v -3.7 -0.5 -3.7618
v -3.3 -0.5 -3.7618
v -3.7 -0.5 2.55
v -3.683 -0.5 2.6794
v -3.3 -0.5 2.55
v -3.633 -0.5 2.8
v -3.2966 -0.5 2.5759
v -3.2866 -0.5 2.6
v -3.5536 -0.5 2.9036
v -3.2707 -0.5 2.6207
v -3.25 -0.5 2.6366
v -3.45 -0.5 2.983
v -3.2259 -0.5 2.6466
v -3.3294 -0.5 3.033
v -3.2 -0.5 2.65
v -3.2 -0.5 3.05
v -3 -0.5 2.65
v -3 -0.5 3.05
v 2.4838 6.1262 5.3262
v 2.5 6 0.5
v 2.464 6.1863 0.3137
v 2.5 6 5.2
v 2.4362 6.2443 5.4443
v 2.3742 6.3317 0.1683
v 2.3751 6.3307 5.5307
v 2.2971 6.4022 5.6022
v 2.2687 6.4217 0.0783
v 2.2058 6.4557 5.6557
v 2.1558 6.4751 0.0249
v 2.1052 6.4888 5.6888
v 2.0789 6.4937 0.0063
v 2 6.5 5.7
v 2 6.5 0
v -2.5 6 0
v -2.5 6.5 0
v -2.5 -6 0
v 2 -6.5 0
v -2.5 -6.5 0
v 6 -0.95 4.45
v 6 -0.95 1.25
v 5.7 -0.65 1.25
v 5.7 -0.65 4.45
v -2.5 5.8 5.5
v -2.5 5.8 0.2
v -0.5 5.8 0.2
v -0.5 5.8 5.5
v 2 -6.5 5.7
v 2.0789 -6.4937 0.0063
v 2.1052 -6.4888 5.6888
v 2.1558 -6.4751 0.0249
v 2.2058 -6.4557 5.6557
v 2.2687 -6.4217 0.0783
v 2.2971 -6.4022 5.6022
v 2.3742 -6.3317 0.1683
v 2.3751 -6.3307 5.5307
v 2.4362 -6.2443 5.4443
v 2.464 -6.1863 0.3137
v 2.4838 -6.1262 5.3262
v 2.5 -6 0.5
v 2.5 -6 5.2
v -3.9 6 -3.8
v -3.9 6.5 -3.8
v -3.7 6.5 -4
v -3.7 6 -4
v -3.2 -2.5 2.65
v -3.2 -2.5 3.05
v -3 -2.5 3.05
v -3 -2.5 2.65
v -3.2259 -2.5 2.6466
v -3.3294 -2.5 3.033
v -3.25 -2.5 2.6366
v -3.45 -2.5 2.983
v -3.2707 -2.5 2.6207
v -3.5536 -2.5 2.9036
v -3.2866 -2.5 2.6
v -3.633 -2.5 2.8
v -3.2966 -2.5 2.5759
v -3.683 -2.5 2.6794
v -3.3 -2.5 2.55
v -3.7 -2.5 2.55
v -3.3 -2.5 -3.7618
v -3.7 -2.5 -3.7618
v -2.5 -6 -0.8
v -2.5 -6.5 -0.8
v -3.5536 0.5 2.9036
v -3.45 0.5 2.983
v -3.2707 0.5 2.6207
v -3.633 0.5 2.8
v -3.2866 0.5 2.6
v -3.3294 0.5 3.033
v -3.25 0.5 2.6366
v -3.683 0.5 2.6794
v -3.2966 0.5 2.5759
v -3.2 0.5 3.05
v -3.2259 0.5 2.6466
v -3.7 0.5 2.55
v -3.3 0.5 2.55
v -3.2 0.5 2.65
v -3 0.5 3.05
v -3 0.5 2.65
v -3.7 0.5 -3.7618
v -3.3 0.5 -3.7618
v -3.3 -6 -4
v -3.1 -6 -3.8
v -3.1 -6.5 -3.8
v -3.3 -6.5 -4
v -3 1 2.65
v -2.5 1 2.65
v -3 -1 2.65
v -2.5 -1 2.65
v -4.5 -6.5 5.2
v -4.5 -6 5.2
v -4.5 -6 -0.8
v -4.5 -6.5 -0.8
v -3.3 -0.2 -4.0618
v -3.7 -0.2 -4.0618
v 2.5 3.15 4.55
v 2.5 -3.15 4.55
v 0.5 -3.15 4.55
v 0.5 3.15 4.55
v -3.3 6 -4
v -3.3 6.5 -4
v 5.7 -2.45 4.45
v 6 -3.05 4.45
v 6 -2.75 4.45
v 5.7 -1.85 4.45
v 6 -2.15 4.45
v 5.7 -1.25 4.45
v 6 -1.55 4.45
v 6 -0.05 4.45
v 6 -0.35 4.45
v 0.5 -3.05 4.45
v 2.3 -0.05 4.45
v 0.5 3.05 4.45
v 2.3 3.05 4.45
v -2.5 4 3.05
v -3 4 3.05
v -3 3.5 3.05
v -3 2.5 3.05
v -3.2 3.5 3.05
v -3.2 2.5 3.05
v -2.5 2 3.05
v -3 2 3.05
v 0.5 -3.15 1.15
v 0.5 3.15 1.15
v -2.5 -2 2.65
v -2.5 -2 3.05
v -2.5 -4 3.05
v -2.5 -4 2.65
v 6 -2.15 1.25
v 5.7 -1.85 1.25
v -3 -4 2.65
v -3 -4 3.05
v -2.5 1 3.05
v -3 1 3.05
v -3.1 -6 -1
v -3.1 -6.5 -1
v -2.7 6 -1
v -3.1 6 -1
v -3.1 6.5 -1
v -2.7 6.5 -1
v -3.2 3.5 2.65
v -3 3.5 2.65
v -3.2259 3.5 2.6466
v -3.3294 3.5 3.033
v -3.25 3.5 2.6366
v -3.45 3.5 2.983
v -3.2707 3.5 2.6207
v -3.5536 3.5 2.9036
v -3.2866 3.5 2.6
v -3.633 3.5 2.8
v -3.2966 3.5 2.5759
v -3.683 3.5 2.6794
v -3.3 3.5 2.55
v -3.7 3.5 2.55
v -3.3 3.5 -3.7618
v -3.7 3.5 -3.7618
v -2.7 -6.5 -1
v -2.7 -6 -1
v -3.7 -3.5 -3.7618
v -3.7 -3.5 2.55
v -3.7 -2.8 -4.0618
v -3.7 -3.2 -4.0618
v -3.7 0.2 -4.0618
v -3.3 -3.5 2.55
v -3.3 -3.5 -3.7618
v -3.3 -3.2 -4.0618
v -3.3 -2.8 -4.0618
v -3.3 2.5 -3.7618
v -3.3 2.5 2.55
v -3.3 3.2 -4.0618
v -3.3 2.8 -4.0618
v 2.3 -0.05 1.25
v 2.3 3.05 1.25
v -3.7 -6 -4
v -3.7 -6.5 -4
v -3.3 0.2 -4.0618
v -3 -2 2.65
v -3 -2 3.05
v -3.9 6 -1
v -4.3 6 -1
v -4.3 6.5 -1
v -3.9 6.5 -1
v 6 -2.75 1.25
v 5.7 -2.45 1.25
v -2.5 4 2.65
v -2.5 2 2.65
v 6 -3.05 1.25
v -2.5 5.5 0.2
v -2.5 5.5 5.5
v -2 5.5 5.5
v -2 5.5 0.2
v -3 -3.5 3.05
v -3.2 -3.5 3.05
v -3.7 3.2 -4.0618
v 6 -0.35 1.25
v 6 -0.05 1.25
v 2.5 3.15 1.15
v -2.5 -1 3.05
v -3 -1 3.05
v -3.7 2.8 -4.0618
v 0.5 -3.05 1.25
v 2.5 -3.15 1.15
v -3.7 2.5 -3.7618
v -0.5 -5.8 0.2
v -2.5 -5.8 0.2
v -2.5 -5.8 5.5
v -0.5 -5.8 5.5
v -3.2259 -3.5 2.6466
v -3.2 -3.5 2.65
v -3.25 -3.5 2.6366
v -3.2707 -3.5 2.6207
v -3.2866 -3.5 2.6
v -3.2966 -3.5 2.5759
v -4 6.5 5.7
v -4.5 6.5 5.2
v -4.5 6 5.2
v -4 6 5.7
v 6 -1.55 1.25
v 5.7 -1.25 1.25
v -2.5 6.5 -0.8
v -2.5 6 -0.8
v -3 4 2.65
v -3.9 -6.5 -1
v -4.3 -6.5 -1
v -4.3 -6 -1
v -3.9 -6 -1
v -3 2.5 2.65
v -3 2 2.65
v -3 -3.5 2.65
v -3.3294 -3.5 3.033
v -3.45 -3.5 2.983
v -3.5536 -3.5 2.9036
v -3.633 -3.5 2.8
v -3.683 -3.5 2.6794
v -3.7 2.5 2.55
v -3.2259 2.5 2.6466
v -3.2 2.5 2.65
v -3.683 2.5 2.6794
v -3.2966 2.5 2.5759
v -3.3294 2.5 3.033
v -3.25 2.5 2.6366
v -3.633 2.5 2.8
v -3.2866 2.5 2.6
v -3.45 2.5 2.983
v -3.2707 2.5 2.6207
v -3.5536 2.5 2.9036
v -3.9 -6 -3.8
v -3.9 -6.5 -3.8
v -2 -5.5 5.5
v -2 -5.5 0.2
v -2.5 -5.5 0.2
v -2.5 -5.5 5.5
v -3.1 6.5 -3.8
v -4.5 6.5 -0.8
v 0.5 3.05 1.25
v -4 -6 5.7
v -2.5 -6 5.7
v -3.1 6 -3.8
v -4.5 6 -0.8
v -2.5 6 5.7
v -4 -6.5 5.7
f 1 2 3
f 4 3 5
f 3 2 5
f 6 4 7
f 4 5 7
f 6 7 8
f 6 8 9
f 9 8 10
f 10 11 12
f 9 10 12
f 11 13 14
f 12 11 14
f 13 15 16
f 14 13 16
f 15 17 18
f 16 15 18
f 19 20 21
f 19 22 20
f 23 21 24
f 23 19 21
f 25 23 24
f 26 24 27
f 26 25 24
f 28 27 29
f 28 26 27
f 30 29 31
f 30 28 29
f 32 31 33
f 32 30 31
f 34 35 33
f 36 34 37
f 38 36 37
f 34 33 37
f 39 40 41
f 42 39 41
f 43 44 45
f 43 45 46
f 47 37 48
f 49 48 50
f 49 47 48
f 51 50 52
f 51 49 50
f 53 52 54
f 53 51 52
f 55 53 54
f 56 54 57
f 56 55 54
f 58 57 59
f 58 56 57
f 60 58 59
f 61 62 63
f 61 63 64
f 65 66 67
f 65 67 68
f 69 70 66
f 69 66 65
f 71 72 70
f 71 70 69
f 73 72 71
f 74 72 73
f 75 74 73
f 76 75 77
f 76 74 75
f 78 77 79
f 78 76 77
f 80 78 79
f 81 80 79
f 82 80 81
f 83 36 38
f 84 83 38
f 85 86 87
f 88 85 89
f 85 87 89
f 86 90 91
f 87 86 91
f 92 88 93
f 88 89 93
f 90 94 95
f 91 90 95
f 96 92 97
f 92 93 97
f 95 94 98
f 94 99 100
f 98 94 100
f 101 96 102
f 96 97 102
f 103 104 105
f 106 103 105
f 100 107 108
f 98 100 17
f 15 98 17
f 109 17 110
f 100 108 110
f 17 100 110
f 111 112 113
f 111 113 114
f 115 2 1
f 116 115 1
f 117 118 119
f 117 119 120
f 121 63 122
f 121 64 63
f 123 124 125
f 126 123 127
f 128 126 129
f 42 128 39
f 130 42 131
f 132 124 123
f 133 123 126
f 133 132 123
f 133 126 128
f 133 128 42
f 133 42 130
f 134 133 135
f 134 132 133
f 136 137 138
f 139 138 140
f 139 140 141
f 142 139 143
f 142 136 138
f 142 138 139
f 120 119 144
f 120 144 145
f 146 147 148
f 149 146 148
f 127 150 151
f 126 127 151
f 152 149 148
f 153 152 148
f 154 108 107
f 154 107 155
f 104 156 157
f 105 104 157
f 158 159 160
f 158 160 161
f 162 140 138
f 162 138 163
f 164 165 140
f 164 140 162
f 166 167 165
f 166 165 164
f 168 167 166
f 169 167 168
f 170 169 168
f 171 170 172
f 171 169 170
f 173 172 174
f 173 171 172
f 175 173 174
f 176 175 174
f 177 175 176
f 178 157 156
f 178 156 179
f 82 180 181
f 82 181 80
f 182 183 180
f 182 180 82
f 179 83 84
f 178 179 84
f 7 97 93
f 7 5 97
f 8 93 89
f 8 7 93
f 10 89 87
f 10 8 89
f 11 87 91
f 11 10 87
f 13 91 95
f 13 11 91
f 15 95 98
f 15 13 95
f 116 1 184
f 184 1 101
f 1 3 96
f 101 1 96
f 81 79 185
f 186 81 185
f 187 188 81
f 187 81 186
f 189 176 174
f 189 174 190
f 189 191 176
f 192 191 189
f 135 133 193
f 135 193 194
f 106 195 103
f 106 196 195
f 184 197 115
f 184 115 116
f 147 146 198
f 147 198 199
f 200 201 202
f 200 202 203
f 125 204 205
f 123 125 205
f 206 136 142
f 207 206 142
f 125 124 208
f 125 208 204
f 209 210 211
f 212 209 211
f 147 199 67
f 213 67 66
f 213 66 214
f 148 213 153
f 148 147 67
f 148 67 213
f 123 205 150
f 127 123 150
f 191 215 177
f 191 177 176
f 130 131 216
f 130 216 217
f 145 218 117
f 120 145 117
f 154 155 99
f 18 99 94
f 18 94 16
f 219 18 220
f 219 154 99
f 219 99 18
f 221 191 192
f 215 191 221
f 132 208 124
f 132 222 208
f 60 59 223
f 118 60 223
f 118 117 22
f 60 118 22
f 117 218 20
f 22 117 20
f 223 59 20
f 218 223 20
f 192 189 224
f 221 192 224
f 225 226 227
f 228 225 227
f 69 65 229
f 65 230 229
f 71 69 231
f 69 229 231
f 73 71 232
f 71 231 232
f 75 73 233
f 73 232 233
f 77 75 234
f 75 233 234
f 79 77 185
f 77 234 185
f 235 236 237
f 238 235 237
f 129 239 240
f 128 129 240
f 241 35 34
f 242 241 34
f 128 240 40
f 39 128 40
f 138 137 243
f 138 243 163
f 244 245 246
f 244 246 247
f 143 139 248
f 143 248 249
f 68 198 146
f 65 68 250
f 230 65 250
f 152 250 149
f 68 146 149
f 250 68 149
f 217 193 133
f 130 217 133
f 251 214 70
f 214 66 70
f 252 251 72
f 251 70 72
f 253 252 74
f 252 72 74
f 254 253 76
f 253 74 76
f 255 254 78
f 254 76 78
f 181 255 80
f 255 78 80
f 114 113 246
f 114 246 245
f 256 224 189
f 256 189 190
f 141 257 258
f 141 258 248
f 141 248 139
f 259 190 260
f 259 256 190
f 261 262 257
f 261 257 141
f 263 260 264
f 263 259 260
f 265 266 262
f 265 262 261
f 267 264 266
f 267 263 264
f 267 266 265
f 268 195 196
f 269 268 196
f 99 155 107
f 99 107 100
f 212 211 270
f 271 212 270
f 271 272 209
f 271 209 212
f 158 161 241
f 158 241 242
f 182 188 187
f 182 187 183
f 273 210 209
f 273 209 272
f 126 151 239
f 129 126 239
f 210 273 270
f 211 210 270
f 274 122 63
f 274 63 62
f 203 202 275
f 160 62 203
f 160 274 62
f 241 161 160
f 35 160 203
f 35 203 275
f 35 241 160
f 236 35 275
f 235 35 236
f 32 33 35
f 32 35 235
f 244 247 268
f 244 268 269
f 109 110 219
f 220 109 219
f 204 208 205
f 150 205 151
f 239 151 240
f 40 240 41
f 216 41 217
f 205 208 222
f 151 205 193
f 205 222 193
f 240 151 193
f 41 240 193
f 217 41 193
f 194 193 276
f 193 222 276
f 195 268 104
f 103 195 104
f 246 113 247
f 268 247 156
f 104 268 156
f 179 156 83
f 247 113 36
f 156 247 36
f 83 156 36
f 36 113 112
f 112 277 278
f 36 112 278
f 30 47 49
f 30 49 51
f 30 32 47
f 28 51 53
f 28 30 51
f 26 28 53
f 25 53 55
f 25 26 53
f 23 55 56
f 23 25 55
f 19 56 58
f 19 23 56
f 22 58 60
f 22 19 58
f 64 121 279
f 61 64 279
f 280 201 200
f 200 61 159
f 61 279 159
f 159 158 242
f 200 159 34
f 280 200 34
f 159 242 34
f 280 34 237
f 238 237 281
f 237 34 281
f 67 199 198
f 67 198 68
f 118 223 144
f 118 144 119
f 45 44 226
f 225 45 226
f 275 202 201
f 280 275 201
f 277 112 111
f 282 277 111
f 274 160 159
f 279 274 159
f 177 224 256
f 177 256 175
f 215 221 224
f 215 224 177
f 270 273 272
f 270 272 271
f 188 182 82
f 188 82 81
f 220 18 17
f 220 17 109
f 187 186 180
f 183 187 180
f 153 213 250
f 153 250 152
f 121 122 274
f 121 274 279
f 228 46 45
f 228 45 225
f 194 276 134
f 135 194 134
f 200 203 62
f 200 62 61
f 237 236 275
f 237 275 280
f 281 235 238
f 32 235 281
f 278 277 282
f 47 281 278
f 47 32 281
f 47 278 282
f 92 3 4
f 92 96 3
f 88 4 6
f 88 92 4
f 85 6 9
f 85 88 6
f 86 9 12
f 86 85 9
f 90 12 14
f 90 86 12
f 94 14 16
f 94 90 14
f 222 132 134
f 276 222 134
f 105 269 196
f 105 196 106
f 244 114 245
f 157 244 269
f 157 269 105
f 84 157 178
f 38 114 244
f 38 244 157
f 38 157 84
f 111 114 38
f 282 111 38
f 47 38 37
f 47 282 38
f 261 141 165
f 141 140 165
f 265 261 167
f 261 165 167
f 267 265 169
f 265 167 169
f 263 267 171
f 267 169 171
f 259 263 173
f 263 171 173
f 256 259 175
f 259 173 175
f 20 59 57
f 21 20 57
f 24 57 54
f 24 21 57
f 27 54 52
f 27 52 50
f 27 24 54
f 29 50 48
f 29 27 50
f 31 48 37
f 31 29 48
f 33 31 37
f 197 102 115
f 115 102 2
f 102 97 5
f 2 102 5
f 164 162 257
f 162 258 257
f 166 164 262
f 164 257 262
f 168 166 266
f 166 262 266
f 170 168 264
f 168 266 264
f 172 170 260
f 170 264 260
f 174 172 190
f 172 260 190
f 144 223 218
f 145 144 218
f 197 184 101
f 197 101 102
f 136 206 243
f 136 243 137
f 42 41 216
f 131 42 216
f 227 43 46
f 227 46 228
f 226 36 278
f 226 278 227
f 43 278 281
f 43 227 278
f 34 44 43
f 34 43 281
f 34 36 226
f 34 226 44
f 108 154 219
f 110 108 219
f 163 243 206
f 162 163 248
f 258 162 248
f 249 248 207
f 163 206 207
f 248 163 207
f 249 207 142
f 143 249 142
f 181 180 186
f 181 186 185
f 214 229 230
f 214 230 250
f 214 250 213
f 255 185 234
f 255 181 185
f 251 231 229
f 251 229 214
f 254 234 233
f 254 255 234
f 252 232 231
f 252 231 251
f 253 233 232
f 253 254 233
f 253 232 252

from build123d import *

# Parameters (mm, degrees)
F0_W       = 5
F0_H       = 13
F1_DEPTH   = 5.7
F2_W       = 6.3
F2_H       = 3.4
F3_DEPTH   = 2
F4_W       = 6.1
F4_H       = 3.2
F5_DEPTH   = 1.8
F6_W       = 3
F6_H       = 3.2
F7_DEPTH   = 3.7
F8_W       = 0.5
F8_H       = 5.7
F9_DEPTH   = 2
F10_W      = 2
F10_H      = 0.5
F11_DEPTH  = 1
F12_W      = 0.8
F12_H      = 0.5
F13_DEPTH  = 3
F14_W      = 0.8
F14_H      = 0.5
F15_DEPTH  = 3
F16_SIZE   = 0.2
F17_SIZE   = 0.2
F18_R      = 0.5
F19_SIZE   = 0.5
F20_W      = 11.6
F20_H      = 5.3
F21_DEPTH  = 2
F22_W      = 0.5
F22_H      = 11
F23_DEPTH  = 5.3
F24_W      = 2
F24_H      = 0.4
F25_DEPTH  = 0.5
F26_W      = 1
F26_H      = 0.4
F29_W      = 1
F29_H      = 0.4
F31_W      = 1
F31_H      = 0.4
F33_SIZE   = 0.3
F33_2_SIZE = 0.3
F33_3_SIZE = 0.3
F35_DEPTH  = 25


with BuildPart() as f1:
    # F0 (on Top) → F1 (new body)
    with BuildSketch(Plane.XY):
        Rectangle(F0_W, F0_H)
    extrude(amount=F1_DEPTH)

    # F2 (on face) → F3 (cut)
    with BuildSketch(Plane.YZ.offset(2.5)):
        with Locations((0, 2.85)):
            Rectangle(F2_W, F2_H)
    extrude(amount=-F3_DEPTH, mode=Mode.SUBTRACT)

    # F8 (on face) → F9 (join)
    with BuildSketch(Plane(origin=(-2.5, 0, 0), x_dir=(0, -1, 0), z_dir=(-1, 0, 0))):
        with Locations((-6.25, 2.85)):
            Rectangle(F8_W, F8_H)
        with Locations((6.25, 2.85)):
            Rectangle(F8_W, F8_H)
    extrude(amount=F9_DEPTH)

    # F10 (on face) → F11 (join)
    with BuildSketch(Plane(origin=(0, 0, 0), x_dir=(1, 0, 0), z_dir=(0, 0, -1))):
        with Locations((-3.5, 6.25)):
            Rectangle(F10_W, F10_H)
        with Locations((-3.5, -6.25)):
            Rectangle(F10_W, F10_H)
    extrude(amount=F11_DEPTH)

    # F12 (on face) → F13 (join)
    with BuildSketch(Plane(origin=(0, 0, -1), x_dir=(1, 0, 0), z_dir=(0, 0, -1))):
        with Locations((-3.5, -6.25)):
            Rectangle(F12_W, F12_H)
    extrude(amount=F13_DEPTH)

    # F14 (on face) → F15 (join)
    with BuildSketch(Plane(origin=(0, 0, -1), x_dir=(1, 0, 0), z_dir=(0, 0, -1))):
        with Locations((-3.5, 6.25)):
            Rectangle(F14_W, F14_H)
    extrude(amount=F15_DEPTH)

    # F16
    f16_edges = [f1.edges().sort_by_distance(p)[0] for p in [
        (-3.9, 6.25, -4),
        (-3.1, 6.25, -4),
        (-3.9, -6.25, -4),
        (-3.1, -6.25, -4),
    ]]
    chamfer(f16_edges, length=F16_SIZE)

    # F17
    f17_edges = [f1.edges().sort_by_distance(p)[0] for p in [
        (-4.5, 6.25, -1),
        (-2.5, 6.25, -1),
        (-4.5, -6.25, -1),
        (-2.5, -6.25, -1),
    ]]
    chamfer(f17_edges, length=F17_SIZE)

    # F18
    f18_edges = [f1.edges().sort_by_distance(p)[0] for p in [
        (2.5, 0, 5.7),
        (2.5, 6.5, 2.85),
        (2.5, 0, 0),
        (2.5, -6.5, 2.85),
    ]]
    fillet(f18_edges, radius=F18_R)

    # F19
    f19_edges = [f1.edges().sort_by_distance(p)[0] for p in [
        (-4.5, 6.25, 5.7),
        (-4.5, -6.25, 5.7),
    ]]
    chamfer(f19_edges, length=F19_SIZE)

    # F20 (on face) → F21 (cut)
    with BuildSketch(Plane(origin=(-2.5, 0, 0), x_dir=(0, -1, 0), z_dir=(-1, 0, 0))):
        with Locations((0, 2.85)):
            Rectangle(F20_W, F20_H)
    extrude(amount=-F21_DEPTH, mode=Mode.SUBTRACT)


with BuildPart() as f5:
    # F4 (on face) → F5 (new body)
    with BuildSketch(Plane.YZ.offset(0.5)):
        with Locations((0, 2.85)):
            Rectangle(F4_W, F4_H)
    extrude(amount=F5_DEPTH)

    # F6 (on face) → F7 (join)
    with BuildSketch(Plane.YZ.offset(2.3)):
        with Locations((-1.55, 2.85)):
            Rectangle(F6_W, F6_H)
    extrude(amount=F7_DEPTH)

    # F34 (on face) → F35 (cut)
    with BuildSketch(Plane(origin=(0, 0, 1.25), x_dir=(1, 0, 0), z_dir=(0, 0, -1))):
        Polygon((6, 2.15), (6, 2.75), (5.7, 2.45), align=None)
        Polygon((6, 1.55), (6, 2.15), (5.7, 1.85), align=None)
        Polygon((6, 0.95), (6, 1.55), (5.7, 1.25), align=None)
        Polygon((6, 0.35), (6, 0.95), (5.7, 0.65), align=None)
    extrude(amount=-F35_DEPTH, mode=Mode.SUBTRACT)


with BuildPart() as f23:
    # F22 (on face) → F23 (new body)
    with BuildSketch(Plane(origin=(0, 0, 5.5), x_dir=(1, 0, 0), z_dir=(0, 0, -1))):
        with Locations((-2.25, 0)):
            Rectangle(F22_W, F22_H)
    extrude(amount=F23_DEPTH)


with BuildPart() as f25:
    # F24 (on face) → F25 (new body)
    with BuildSketch(Plane(origin=(-2.5, 0, 0), x_dir=(0, -1, 0), z_dir=(-1, 0, 0))):
        with Locations((0, 2.85)):
            Rectangle(F24_W, F24_H)
    extrude(amount=F25_DEPTH)

    # F28: sweep along a path in F27
    with BuildLine(Plane(origin=(0, 1, 0), x_dir=(-1, 0, 0), z_dir=(0, 1, 0))) as f28_path:
        Line((3.5, -4.0618096853), (3.5, 2.55))
        ThreePointArc((3.5, 2.55), (3.4121320344, 2.7621320344), (3.2, 2.85))
        Line((3.2, 2.85), (3, 2.85))
    # F26 (on face) → F28 (sweep)
    with BuildSketch(Plane(origin=(-3, 0, 0), x_dir=(0, -1, 0), z_dir=(-1, 0, 0))):
        with Locations((0, 2.85)):
            Rectangle(F26_W, F26_H)
    sweep(path=f28_path.line)

    # F33#2
    f33_2_edges = [f25.edges().sort_by_distance(p)[0] for p in [
        (-3.5, -0.5, -4.06181),
        (-3.5, 0.5, -4.06181),
    ]]
    chamfer(f33_2_edges, length=F33_2_SIZE)


with BuildPart() as f25b:
    # F24 (on face) → F25, piece 2 (new body)
    with BuildSketch(Plane(origin=(-2.5, 0, 0), x_dir=(0, -1, 0), z_dir=(-1, 0, 0))):
        with Locations((3, 2.85)):
            Rectangle(F24_W, F24_H)
    extrude(amount=F25_DEPTH)

    # F30: sweep along a path in F27
    with BuildLine(Plane(origin=(0, 1, 0), x_dir=(-1, 0, 0), z_dir=(0, 1, 0))) as f30_path:
        Line((3, 2.85), (3.2, 2.85))
        ThreePointArc((3.2, 2.85), (3.4121320344, 2.7621320344), (3.5, 2.55))
        Line((3.5, 2.55), (3.5, -4.0618096853))
    # F29 (on face) → F30 (sweep)
    with BuildSketch(Plane(origin=(-3, 0, 0), x_dir=(0, -1, 0), z_dir=(-1, 0, 0))):
        with Locations((3, 2.85)):
            Rectangle(F29_W, F29_H)
    sweep(path=f30_path.line)

    # F33
    f33_edges = [f25b.edges().sort_by_distance(p)[0] for p in [
        (-3.5, -3.5, -4.06181),
        (-3.5, -2.5, -4.06181),
    ]]
    chamfer(f33_edges, length=F33_SIZE)


with BuildPart() as f25c:
    # F24 (on face) → F25, piece 3 (new body)
    with BuildSketch(Plane(origin=(-2.5, 0, 0), x_dir=(0, -1, 0), z_dir=(-1, 0, 0))):
        with Locations((-3, 2.85)):
            Rectangle(F24_W, F24_H)
    extrude(amount=F25_DEPTH)

    # F32: sweep along a path in F27
    with BuildLine(Plane(origin=(0, 1, 0), x_dir=(-1, 0, 0), z_dir=(0, 1, 0))) as f32_path:
        Line((3, 2.85), (3.2, 2.85))
        ThreePointArc((3.2, 2.85), (3.4121320344, 2.7621320344), (3.5, 2.55))
        Line((3.5, 2.55), (3.5, -4.0618096853))
    # F31 (on face) → F32 (sweep)
    with BuildSketch(Plane(origin=(-3, 0, 0), x_dir=(0, -1, 0), z_dir=(-1, 0, 0))):
        with Locations((-3, 2.85)):
            Rectangle(F31_W, F31_H)
    sweep(path=f32_path.line)

    # F33#3
    f33_3_edges = [f25c.edges().sort_by_distance(p)[0] for p in [
        (-3.5, 2.5, -4.06181),
        (-3.5, 3.5, -4.06181),
    ]]
    chamfer(f33_3_edges, length=F33_3_SIZE)


solid = Compound([f1.part, f5.part, f23.part, f25.part, f25b.part, f25c.part])
